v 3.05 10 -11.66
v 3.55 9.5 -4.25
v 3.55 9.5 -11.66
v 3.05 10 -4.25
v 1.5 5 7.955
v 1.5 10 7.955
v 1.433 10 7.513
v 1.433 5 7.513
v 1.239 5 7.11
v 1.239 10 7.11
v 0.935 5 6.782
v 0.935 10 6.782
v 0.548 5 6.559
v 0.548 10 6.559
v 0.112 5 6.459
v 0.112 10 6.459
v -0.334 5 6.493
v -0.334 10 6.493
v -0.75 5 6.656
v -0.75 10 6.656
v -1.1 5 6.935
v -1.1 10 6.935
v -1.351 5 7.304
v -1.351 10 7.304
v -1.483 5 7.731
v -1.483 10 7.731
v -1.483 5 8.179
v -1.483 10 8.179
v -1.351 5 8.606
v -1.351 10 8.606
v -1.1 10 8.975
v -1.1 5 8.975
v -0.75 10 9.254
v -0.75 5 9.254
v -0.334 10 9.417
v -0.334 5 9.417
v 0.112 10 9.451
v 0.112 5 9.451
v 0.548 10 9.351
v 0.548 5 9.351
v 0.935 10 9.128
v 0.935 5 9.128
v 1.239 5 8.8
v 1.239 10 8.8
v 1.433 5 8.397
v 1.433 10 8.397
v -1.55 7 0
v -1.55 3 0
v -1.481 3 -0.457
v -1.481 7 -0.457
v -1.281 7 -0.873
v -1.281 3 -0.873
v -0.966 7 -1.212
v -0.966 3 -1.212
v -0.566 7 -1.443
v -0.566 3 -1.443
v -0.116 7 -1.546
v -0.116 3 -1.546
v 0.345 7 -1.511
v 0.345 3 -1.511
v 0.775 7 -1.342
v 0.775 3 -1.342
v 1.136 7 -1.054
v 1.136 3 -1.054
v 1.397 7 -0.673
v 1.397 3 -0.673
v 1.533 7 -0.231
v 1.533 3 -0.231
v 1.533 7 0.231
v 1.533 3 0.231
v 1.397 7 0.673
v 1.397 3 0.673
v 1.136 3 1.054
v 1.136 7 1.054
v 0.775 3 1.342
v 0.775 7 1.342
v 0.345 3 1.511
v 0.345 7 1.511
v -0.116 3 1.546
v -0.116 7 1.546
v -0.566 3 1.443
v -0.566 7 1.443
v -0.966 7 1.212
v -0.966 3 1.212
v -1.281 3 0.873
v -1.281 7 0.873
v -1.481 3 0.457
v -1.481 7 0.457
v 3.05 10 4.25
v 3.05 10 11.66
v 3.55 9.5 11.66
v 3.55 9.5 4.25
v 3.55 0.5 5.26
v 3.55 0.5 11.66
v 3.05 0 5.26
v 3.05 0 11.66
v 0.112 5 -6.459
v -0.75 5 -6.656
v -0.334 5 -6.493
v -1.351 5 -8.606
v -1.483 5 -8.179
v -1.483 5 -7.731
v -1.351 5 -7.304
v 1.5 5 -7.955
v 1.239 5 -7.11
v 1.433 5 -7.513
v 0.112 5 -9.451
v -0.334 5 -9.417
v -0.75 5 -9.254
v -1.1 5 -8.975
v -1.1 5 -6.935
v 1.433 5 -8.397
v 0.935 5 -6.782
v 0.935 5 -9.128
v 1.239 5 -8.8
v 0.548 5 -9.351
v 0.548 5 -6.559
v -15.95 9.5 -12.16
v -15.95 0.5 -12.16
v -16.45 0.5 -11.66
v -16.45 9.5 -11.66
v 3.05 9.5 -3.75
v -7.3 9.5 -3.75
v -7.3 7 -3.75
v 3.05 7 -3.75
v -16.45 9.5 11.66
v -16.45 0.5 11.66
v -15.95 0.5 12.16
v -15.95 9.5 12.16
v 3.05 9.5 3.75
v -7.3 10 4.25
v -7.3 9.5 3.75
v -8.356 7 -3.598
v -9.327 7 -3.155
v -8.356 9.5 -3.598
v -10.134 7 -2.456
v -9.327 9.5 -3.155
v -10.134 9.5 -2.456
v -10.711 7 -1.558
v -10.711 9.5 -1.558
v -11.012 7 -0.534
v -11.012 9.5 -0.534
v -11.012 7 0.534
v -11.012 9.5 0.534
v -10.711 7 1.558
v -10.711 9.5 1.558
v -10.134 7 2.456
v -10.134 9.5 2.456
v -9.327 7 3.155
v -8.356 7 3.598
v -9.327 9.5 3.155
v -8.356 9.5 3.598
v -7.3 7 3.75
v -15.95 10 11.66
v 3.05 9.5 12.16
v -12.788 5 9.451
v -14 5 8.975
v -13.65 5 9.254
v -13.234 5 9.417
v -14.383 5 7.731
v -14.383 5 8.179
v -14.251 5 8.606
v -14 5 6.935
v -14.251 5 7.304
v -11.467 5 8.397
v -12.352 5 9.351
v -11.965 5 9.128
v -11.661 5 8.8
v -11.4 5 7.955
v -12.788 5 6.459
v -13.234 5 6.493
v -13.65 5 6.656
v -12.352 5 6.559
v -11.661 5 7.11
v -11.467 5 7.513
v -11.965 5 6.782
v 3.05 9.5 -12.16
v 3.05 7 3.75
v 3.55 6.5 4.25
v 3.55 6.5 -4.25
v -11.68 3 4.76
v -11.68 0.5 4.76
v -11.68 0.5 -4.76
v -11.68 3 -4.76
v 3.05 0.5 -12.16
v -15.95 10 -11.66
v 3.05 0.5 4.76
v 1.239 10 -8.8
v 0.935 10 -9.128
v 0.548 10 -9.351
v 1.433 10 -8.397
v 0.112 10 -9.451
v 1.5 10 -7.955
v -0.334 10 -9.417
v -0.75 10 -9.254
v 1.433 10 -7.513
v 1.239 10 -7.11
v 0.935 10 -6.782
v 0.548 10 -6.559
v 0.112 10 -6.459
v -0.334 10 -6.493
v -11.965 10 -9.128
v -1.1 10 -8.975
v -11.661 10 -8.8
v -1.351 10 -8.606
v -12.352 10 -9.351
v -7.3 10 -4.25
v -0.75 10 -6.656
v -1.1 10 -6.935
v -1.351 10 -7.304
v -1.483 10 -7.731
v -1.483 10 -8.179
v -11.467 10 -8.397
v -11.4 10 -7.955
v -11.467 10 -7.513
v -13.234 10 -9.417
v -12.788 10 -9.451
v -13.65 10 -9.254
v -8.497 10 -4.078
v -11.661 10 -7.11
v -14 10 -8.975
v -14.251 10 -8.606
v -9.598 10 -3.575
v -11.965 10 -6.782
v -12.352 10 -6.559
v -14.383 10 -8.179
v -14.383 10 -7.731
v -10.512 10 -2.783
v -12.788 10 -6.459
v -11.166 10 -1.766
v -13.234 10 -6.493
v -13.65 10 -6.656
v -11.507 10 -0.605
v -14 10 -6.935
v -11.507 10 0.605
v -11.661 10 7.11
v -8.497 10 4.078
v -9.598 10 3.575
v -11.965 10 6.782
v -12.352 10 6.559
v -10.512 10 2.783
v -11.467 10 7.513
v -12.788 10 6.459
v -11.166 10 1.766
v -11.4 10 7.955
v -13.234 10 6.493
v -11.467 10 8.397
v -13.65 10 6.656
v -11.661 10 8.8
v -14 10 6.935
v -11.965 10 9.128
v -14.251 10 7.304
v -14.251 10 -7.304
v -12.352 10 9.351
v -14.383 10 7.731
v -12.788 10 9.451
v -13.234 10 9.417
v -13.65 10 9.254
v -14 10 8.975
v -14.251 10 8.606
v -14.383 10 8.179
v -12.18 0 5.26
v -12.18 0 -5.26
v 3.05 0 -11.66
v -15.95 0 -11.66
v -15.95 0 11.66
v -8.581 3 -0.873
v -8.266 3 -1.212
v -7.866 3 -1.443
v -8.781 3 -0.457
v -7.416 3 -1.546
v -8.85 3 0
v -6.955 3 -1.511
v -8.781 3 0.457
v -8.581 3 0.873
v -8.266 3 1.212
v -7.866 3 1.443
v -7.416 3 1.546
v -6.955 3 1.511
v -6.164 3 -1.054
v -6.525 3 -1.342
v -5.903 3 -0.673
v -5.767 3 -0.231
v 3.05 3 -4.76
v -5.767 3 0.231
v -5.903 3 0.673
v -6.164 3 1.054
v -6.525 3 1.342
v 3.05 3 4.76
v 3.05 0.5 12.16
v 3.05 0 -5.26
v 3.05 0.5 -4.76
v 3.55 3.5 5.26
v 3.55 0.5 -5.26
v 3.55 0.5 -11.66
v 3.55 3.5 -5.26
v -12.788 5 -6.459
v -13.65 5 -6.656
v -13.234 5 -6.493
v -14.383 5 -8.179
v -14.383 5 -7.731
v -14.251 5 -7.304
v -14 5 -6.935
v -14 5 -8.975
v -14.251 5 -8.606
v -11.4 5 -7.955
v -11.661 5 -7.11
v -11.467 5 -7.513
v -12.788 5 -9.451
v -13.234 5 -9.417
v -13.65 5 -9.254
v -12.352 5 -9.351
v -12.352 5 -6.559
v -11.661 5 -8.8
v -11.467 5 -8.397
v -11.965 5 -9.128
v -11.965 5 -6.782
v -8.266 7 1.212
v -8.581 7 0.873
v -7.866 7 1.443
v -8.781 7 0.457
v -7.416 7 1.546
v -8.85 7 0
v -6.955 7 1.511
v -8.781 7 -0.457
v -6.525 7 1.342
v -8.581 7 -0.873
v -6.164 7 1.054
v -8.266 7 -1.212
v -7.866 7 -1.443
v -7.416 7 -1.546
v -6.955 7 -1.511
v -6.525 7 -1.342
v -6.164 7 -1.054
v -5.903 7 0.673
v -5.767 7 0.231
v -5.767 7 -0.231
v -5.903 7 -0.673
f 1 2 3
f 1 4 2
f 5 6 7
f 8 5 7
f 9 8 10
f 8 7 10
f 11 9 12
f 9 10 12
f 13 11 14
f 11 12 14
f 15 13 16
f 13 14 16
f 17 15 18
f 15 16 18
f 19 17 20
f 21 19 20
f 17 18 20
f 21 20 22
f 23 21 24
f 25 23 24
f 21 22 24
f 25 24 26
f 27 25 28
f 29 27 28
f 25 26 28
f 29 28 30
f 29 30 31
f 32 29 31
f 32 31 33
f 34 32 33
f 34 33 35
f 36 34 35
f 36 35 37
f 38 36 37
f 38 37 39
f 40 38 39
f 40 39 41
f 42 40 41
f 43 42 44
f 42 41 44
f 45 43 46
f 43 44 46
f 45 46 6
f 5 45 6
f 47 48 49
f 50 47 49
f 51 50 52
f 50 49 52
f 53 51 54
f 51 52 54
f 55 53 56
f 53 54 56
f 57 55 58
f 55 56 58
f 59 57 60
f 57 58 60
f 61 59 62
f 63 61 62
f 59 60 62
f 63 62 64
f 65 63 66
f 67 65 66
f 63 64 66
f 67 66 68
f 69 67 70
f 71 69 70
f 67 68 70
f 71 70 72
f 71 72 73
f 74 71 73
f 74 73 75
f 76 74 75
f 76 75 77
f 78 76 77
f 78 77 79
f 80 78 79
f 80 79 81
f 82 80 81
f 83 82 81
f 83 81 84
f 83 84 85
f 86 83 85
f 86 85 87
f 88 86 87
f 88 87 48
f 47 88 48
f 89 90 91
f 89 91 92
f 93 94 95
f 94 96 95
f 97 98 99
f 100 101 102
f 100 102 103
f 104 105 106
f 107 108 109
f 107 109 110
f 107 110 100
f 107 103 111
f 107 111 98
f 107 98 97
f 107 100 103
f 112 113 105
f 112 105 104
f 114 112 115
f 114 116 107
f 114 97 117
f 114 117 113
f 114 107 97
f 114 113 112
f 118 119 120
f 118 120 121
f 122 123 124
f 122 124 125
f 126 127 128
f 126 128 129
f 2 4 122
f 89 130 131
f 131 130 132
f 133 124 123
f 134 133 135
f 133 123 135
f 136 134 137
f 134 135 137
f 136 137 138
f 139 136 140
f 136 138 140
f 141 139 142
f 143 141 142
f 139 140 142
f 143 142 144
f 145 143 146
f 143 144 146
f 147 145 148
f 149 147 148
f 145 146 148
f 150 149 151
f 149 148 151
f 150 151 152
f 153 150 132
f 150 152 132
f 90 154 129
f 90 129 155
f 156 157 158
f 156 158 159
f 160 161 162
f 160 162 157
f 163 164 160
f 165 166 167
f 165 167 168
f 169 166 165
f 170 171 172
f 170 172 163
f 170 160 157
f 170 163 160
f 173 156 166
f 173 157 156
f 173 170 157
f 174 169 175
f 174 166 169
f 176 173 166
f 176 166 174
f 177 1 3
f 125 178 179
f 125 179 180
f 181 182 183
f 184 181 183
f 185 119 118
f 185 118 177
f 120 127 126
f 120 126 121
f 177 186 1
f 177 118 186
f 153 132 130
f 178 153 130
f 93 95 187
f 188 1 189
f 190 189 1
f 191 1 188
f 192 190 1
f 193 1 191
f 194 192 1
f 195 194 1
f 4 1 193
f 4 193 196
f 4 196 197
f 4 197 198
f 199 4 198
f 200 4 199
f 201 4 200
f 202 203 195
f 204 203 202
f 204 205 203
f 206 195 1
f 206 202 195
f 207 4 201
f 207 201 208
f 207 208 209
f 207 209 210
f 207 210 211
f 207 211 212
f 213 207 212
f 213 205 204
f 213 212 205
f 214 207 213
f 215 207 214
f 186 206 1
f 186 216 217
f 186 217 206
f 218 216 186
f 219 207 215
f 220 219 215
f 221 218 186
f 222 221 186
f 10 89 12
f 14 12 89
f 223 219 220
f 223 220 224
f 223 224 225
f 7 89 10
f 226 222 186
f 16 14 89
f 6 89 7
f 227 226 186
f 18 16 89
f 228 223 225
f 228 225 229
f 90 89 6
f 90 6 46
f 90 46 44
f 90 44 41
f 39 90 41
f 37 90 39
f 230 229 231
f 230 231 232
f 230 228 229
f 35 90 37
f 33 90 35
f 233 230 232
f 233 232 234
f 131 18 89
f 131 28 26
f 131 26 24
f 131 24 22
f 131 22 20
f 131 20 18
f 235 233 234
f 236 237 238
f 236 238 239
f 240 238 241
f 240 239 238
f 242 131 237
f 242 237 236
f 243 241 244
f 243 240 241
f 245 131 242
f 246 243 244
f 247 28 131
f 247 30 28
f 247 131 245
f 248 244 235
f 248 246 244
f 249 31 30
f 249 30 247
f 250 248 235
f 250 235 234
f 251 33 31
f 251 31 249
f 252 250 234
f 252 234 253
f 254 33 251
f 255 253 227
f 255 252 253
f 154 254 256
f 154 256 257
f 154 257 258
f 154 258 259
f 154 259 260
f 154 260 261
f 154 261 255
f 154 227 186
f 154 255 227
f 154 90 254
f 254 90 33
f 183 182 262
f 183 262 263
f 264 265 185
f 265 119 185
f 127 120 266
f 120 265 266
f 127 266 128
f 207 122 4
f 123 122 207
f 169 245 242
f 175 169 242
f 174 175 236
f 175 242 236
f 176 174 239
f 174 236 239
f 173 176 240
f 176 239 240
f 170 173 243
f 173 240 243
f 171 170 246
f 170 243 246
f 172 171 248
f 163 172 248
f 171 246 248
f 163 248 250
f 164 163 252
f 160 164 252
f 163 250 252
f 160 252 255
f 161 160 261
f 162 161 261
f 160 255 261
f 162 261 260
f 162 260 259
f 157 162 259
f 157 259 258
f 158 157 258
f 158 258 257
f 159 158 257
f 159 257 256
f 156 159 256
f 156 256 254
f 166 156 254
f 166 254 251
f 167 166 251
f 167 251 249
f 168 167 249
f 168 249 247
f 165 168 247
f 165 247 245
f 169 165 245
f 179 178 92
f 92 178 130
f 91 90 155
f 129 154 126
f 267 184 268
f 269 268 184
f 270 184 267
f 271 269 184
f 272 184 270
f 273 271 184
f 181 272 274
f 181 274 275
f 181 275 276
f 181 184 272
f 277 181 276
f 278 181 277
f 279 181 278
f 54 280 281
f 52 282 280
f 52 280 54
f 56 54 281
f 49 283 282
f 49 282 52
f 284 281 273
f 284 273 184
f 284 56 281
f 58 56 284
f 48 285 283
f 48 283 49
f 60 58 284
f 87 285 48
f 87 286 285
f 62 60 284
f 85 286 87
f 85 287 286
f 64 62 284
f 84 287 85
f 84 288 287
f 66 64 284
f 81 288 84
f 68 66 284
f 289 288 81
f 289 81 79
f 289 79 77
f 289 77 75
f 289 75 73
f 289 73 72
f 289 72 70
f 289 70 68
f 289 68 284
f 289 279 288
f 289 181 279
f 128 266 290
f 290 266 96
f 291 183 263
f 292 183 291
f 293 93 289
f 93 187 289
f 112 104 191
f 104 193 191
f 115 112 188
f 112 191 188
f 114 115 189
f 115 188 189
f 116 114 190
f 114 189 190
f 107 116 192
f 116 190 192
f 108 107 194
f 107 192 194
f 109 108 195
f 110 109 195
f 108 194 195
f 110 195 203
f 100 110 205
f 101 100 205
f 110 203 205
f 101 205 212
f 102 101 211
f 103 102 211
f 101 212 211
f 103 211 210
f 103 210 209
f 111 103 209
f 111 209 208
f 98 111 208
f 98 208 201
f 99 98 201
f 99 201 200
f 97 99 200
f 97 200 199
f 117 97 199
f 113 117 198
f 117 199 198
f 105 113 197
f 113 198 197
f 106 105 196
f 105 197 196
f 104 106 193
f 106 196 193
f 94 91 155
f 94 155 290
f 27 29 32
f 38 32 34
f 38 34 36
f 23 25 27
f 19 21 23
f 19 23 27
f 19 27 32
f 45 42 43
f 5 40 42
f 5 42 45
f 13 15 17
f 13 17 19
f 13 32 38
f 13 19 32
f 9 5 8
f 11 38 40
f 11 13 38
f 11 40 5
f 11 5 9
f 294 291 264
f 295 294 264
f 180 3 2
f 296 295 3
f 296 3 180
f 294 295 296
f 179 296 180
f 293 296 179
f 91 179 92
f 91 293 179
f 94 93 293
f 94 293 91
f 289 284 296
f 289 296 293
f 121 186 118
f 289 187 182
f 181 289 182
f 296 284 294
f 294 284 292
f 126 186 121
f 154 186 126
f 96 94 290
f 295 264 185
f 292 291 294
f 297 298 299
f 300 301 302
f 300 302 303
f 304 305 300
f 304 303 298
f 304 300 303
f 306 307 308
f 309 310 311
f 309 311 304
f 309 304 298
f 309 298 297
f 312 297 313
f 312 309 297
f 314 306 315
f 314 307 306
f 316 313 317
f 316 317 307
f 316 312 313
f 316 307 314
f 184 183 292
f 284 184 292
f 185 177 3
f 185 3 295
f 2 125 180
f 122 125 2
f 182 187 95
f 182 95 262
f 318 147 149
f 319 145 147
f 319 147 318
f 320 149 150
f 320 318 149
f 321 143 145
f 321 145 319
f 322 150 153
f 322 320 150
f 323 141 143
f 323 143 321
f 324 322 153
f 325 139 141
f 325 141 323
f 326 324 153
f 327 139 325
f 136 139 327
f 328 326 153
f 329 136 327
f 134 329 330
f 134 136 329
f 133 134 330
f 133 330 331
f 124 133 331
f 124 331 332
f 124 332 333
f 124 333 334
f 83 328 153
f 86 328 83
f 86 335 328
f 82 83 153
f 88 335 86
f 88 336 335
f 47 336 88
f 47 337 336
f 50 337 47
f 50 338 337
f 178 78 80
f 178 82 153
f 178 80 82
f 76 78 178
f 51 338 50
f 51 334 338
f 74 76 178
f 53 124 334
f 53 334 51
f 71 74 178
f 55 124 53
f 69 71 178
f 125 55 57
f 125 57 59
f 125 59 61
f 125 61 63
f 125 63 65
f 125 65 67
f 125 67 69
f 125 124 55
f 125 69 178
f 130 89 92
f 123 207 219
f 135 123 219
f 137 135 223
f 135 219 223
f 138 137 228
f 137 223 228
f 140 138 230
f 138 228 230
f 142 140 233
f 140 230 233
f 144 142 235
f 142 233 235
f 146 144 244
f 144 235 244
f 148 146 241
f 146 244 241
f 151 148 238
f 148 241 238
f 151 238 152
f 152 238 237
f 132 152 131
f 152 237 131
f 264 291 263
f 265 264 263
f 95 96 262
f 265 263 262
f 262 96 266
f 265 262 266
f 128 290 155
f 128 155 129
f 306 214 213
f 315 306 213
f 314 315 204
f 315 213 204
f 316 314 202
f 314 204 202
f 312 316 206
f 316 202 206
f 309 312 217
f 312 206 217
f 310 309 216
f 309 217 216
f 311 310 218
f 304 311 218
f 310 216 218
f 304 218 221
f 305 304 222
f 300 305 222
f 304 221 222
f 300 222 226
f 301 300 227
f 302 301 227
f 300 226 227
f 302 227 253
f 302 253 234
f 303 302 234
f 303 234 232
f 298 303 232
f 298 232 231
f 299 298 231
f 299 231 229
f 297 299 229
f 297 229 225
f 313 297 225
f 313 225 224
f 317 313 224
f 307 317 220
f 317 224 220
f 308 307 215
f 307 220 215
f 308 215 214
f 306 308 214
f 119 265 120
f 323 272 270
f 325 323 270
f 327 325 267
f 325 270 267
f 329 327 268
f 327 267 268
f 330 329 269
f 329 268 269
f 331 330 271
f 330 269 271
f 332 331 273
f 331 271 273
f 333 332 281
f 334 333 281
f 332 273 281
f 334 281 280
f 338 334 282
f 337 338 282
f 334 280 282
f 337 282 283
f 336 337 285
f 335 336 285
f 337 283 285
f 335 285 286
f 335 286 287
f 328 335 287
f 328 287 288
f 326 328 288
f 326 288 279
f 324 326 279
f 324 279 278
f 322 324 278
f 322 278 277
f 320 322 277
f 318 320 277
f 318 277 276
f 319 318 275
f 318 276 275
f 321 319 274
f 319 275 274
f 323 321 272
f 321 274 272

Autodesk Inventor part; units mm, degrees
ref_plane "YZ Plane" through (0, 0, 0) normal (1, 0, 0) x (0, 1, 0)
ref_plane "XZ Plane" through (0, 0, 0) normal (0, 1, 0) x (-1, 0, 0)
ref_plane "XY Plane" through (0, 0, 0) normal (0, 0, 1) x (1, 0, 0)
sketch "Sketch1" plane through (0, 0, 0) normal (0, 1, 0) x (-1, 0, 0)
  circle A0 centre (7.3, 0) radius 1.55
  circle A1 centre (0, 0) radius 1.55
  line L0 (0, 10.8163) -> (0, -10.8163)
  line L1 (6.335, 0) -> (-6.335, 0)
  line L2 (-3.55, 12.16) -> (16.45, 12.16)
  line L3 (16.45, 12.16) -> (16.45, -12.16)
  line L4 (16.45, -12.16) -> (-3.55, -12.16)
  line L5 (-3.55, -12.16) -> (-3.55, 12.16)
  dimension "d0" = 3.1
  dimension "d1" = 7.3
  dimension "d2" = 2
  dimension "d3" = 24.32
  dimension "d4" = 20
extrude "Extrusion1" add sketch "Sketch1" along normal blind 10
sketch "Sketch2" plane through (0, 0, 0) normal (0, -1, 0) x (1, 0, 0)
  line L0 (3.55, 4.76) -> (-11.68, 4.76)
  line L1 (-11.68, 4.76) -> (-11.68, -4.76)
  line L2 (-11.68, -4.76) -> (3.55, -4.76)
  line L3 (3.55, -4.76) -> (3.55, 4.76)
  circle A0 centre (0, 0) radius 1.55 projected
  circle A1 centre (-7.3, 0) radius 1.55 projected
  line L4 (0, 0) -> (-7.3, 0)
  line L5 (3.55, 12.16) -> (3.55, -12.16) projected
  dimension "d7" = 9.52
  dimension "d8" = 4.38
extrude "Extrusion2" cut sketch "Sketch2" against normal blind 3
sketch "Sketch3" plane through (0, 10, 0) normal (0, 1, 0) x (1, 0, 0)
  circle A0 centre (-7.3, 0) radius 1.55 projected
  circle A1 centre (0, 0) radius 1.55 projected
  arc A2 (3.55, -1.2083) -> (3.55, 1.2083) centre (0, 0) ccw
  arc A3 (-7.3, 3.75) -> (-7.3, -3.75) centre (-7.3, 0) ccw
  line L0 (3.55, -12.16) -> (3.55, 12.16) projected
  line L1 (-7.3, 3.75) -> (0, 3.75)
  line L2 (-7.3, -3.75) -> (0, -3.75)
  line L3 (3.55, -1.2083) -> (3.55, 1.2083)
  line L4 (3.55, -1.2083) -> (3.55, 1.2083)
  line L5 (0, -3.75) -> (3.55, -3.75)
  line L6 (0, 3.75) -> (3.55, 3.75)
  dimension "d11" = 7.5
extrude "Extrusion3" cut sketch "Sketch3" against normal blind 3 contours L0 L5 L2 A3 L1 L6
sketch "Sketch4" plane through (0, 10, 0) normal (0, 1, 0) x (1, 0, 0)
  line L0 (3.55, -12.16) -> (3.55, -3.75) projected
  line L1 (3.55, -3.75) -> (-7.3, -3.75) projected
  arc A0 (-7.3, 3.75) -> (-7.3, -3.75) centre (-7.3, 0) ccw projected
  line L2 (-7.3, 3.75) -> (3.55, 3.75) projected
  line L3 (3.55, 3.75) -> (3.55, -3.75) projected
  circle A1 centre (0, -7.955) radius 1.5
  circle A2 centre (-12.9, -7.955) radius 1.5
  line L4 (-16.45, 12.16) -> (-16.45, -12.16) projected
  line L5 (-16.45, 0) -> (3.55, 0)
  circle A3 centre (0, 7.955) radius 1.5
  circle A4 centre (-12.9, 7.955) radius 1.5
  line L6 (3.55, -7.955) -> (-16.45, -7.955)
  line L7 (3.55, 4.76) -> (3.55, 12.16) projected
  line L8 (3.55, 7.955) -> (-16.45, 7.955)
  line L9 (-11.05, 0) -> (-16.45, 0) construction
  point P0 (0, 0)
  dimension "d15" = 3
  dimension "d16" = 3
  dimension "d18" = 3.55
  dimension "d19" = 3.55
extrude "Extrusion4" cut sketch "Sketch4" against normal blind 5 contours L6 A1 | A1 L6 | L6 A2 | A2 L6 | L8 A3 | A3 L8 | L8 A4 | A4 L8
chamfer "Chamfer1" distance 0.5 angle 45 26 edges at (3.55, 10, 7.955) (-1.875, 10, 3.75) (-11.05, 10, 0) (-1.875, 10, -3.75) (3.55, 10, -7.955) (-6.45, 10, -12.16) (-16.45, 10, 0) (-6.45, 10, 12.16) (3.55, 5, 12.16) (3.55, 0, 8.46) (-6.45, 0, 12.16) (-16.45, 0, 0) (-6.45, 0, -12.16) (3.55, 0, -8.46) (3.55, 5, -12.16) (-16.45, 5, -12.16) (-16.45, 5, 12.16) (-11.68, 0, 0) (-4.065, 0, 4.76) (-4.065, 0, -4.76) (3.55, 1.5, 4.76) (3.55, 1.5, -4.76) (3.55, 3, 0) (3.55, 7, 0) (3.55, 8.5, 3.75) (3.55, 8.5, -3.75)
ref_plane "Work Plane1" through (-15.95, 0.5, 0) normal (0, 0, 1) x (1, 0, 0)
equation "\"d0\" = spacer_hole_diameter"
equation "\"d1\" = load_cell_hole_discance"
equation "\"load_cell_hole_discance\" = 7.3"
equation "\"spacer_hole_diameter\" = 3.1"
equation "\"load_cell_width\" = 9.32"
equation "\"load_cell_hole_edge\" = 4.18"
properties part number "load_cell_connector_top"
